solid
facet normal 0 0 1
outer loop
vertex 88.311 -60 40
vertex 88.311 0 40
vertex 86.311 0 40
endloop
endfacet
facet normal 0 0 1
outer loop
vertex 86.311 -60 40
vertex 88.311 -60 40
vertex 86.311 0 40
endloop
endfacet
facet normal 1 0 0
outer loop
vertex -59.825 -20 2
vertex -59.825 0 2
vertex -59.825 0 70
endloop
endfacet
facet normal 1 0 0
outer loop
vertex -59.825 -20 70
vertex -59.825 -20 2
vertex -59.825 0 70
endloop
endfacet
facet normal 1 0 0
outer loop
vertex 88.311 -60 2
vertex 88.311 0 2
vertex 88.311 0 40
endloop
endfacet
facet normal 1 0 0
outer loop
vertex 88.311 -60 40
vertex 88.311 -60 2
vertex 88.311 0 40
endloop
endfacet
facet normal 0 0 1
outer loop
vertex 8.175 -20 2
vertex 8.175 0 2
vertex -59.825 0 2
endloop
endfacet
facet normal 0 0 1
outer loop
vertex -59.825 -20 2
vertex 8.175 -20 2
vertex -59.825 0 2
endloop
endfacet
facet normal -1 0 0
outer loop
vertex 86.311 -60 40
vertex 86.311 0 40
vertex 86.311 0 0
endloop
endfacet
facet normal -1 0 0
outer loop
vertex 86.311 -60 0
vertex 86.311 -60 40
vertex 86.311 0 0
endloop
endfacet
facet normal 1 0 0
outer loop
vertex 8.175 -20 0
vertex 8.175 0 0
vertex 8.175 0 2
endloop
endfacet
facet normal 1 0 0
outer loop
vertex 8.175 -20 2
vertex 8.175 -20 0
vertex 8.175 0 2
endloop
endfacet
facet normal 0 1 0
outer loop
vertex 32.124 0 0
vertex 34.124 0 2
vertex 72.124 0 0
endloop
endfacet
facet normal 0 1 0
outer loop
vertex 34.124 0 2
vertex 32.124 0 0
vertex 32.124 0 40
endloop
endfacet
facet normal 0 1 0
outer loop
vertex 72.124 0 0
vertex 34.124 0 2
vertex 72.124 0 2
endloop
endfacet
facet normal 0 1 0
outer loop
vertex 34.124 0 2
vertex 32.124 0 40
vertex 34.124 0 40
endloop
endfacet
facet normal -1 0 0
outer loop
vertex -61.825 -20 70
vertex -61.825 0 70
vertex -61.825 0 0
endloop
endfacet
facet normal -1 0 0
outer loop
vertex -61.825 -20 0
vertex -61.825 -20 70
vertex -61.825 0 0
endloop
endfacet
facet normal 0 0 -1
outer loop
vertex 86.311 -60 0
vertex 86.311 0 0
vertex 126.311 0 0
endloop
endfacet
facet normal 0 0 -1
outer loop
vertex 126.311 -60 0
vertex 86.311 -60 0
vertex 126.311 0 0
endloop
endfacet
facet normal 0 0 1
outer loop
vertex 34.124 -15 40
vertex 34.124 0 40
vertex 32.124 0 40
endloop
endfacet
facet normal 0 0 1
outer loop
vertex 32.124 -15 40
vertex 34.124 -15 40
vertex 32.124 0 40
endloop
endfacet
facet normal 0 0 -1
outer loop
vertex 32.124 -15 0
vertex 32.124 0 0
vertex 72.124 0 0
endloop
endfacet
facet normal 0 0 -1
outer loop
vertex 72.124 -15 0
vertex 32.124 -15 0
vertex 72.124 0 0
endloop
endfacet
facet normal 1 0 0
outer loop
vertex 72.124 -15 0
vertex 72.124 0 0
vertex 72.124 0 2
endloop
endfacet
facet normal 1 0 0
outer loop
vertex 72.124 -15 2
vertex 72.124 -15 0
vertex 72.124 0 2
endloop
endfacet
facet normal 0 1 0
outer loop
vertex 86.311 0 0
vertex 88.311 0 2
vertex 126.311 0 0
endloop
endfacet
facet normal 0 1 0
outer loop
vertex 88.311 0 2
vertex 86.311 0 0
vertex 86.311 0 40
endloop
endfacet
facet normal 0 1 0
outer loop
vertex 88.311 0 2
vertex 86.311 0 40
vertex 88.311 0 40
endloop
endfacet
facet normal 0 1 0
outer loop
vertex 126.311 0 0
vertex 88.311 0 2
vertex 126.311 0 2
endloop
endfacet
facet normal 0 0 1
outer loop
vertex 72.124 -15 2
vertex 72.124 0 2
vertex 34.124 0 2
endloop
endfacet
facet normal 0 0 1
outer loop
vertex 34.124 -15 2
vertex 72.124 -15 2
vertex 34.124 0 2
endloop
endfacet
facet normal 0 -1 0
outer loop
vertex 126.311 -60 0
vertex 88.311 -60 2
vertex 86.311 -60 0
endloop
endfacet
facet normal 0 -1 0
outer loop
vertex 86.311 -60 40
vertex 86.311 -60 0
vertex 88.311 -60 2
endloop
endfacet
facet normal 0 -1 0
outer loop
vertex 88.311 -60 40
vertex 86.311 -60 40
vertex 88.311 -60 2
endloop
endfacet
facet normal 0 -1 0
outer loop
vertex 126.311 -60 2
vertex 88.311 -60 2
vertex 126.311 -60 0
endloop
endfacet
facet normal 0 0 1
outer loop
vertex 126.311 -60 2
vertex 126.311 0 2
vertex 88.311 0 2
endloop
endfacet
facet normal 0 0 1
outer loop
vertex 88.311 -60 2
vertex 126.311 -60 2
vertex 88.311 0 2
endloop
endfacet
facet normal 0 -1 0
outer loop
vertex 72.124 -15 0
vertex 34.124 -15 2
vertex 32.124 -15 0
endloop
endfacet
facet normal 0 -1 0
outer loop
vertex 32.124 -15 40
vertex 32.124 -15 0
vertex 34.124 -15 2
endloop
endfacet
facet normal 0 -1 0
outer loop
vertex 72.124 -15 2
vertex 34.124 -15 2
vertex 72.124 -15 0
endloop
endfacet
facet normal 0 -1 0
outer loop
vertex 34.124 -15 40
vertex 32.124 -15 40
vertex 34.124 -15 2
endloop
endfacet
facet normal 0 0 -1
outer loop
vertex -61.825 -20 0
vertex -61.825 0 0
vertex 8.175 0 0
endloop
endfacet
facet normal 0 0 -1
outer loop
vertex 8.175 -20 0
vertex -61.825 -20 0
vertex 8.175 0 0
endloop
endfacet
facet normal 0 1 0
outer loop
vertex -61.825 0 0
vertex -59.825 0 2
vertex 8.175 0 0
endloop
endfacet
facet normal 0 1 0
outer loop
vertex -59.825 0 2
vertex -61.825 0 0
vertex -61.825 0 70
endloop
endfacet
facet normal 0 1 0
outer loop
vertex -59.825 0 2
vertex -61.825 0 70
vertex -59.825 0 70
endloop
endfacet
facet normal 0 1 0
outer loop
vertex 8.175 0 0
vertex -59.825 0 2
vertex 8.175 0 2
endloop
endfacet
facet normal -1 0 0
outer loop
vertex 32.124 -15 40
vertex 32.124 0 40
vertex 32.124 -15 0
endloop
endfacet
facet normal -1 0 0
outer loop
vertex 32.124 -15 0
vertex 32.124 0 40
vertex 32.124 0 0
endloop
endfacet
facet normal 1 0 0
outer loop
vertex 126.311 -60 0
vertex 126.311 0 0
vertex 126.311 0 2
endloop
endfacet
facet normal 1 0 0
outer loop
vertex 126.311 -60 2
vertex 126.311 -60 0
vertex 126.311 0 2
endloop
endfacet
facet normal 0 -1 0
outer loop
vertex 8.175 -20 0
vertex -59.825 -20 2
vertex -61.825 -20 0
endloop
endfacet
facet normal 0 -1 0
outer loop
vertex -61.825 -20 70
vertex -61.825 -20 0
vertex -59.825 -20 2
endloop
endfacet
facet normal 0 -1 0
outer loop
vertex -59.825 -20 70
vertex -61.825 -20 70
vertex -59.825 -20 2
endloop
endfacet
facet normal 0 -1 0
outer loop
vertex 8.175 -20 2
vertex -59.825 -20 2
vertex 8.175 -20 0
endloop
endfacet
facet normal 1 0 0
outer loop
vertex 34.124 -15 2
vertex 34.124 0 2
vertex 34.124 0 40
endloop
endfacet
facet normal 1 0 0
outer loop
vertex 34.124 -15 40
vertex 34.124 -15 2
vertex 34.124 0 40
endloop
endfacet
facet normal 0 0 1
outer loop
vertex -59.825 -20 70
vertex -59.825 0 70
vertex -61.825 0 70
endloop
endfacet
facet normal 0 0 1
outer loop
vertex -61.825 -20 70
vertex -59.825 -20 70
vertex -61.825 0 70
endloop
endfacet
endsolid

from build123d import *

# Parameters (mm, degrees)
F1_DEPTH = 20
F2_DEPTH = 15
F3_DEPTH = 60


with BuildPart() as f1:
    # F0 (on Front) → F1 (new body)
    with BuildSketch(Plane.XZ):
        Polygon((-59.82465, 70), (-61.82465, 70), (-61.82465, 2), (-61.82465, 0), (-59.82465, 0), (8.17535, 0), (8.17535, 2), (-59.82465, 2), align=None)
    extrude(amount=F1_DEPTH)


with BuildPart() as f2:
    # F0 (on Front) → F2 (new body)
    with BuildSketch(Plane.XZ):
        Polygon((34.12422, 40), (32.12422, 40), (32.12422, 2), (32.12422, 0), (34.12422, 0), (72.12422, 0), (72.12422, 2), (34.12422, 2), align=None)
    extrude(amount=F2_DEPTH)


with BuildPart() as f3:
    # F0 (on Front) → F3 (new body)
    with BuildSketch(Plane.XZ):
        Polygon((88.3113, 40), (86.3113, 40), (86.3113, 2), (86.3113, 0), (88.3113, 0), (126.3113, 0), (126.3113, 2), (88.3113, 2), align=None)
    extrude(amount=F3_DEPTH)


solid = Compound([f1.part, f2.part, f3.part])
